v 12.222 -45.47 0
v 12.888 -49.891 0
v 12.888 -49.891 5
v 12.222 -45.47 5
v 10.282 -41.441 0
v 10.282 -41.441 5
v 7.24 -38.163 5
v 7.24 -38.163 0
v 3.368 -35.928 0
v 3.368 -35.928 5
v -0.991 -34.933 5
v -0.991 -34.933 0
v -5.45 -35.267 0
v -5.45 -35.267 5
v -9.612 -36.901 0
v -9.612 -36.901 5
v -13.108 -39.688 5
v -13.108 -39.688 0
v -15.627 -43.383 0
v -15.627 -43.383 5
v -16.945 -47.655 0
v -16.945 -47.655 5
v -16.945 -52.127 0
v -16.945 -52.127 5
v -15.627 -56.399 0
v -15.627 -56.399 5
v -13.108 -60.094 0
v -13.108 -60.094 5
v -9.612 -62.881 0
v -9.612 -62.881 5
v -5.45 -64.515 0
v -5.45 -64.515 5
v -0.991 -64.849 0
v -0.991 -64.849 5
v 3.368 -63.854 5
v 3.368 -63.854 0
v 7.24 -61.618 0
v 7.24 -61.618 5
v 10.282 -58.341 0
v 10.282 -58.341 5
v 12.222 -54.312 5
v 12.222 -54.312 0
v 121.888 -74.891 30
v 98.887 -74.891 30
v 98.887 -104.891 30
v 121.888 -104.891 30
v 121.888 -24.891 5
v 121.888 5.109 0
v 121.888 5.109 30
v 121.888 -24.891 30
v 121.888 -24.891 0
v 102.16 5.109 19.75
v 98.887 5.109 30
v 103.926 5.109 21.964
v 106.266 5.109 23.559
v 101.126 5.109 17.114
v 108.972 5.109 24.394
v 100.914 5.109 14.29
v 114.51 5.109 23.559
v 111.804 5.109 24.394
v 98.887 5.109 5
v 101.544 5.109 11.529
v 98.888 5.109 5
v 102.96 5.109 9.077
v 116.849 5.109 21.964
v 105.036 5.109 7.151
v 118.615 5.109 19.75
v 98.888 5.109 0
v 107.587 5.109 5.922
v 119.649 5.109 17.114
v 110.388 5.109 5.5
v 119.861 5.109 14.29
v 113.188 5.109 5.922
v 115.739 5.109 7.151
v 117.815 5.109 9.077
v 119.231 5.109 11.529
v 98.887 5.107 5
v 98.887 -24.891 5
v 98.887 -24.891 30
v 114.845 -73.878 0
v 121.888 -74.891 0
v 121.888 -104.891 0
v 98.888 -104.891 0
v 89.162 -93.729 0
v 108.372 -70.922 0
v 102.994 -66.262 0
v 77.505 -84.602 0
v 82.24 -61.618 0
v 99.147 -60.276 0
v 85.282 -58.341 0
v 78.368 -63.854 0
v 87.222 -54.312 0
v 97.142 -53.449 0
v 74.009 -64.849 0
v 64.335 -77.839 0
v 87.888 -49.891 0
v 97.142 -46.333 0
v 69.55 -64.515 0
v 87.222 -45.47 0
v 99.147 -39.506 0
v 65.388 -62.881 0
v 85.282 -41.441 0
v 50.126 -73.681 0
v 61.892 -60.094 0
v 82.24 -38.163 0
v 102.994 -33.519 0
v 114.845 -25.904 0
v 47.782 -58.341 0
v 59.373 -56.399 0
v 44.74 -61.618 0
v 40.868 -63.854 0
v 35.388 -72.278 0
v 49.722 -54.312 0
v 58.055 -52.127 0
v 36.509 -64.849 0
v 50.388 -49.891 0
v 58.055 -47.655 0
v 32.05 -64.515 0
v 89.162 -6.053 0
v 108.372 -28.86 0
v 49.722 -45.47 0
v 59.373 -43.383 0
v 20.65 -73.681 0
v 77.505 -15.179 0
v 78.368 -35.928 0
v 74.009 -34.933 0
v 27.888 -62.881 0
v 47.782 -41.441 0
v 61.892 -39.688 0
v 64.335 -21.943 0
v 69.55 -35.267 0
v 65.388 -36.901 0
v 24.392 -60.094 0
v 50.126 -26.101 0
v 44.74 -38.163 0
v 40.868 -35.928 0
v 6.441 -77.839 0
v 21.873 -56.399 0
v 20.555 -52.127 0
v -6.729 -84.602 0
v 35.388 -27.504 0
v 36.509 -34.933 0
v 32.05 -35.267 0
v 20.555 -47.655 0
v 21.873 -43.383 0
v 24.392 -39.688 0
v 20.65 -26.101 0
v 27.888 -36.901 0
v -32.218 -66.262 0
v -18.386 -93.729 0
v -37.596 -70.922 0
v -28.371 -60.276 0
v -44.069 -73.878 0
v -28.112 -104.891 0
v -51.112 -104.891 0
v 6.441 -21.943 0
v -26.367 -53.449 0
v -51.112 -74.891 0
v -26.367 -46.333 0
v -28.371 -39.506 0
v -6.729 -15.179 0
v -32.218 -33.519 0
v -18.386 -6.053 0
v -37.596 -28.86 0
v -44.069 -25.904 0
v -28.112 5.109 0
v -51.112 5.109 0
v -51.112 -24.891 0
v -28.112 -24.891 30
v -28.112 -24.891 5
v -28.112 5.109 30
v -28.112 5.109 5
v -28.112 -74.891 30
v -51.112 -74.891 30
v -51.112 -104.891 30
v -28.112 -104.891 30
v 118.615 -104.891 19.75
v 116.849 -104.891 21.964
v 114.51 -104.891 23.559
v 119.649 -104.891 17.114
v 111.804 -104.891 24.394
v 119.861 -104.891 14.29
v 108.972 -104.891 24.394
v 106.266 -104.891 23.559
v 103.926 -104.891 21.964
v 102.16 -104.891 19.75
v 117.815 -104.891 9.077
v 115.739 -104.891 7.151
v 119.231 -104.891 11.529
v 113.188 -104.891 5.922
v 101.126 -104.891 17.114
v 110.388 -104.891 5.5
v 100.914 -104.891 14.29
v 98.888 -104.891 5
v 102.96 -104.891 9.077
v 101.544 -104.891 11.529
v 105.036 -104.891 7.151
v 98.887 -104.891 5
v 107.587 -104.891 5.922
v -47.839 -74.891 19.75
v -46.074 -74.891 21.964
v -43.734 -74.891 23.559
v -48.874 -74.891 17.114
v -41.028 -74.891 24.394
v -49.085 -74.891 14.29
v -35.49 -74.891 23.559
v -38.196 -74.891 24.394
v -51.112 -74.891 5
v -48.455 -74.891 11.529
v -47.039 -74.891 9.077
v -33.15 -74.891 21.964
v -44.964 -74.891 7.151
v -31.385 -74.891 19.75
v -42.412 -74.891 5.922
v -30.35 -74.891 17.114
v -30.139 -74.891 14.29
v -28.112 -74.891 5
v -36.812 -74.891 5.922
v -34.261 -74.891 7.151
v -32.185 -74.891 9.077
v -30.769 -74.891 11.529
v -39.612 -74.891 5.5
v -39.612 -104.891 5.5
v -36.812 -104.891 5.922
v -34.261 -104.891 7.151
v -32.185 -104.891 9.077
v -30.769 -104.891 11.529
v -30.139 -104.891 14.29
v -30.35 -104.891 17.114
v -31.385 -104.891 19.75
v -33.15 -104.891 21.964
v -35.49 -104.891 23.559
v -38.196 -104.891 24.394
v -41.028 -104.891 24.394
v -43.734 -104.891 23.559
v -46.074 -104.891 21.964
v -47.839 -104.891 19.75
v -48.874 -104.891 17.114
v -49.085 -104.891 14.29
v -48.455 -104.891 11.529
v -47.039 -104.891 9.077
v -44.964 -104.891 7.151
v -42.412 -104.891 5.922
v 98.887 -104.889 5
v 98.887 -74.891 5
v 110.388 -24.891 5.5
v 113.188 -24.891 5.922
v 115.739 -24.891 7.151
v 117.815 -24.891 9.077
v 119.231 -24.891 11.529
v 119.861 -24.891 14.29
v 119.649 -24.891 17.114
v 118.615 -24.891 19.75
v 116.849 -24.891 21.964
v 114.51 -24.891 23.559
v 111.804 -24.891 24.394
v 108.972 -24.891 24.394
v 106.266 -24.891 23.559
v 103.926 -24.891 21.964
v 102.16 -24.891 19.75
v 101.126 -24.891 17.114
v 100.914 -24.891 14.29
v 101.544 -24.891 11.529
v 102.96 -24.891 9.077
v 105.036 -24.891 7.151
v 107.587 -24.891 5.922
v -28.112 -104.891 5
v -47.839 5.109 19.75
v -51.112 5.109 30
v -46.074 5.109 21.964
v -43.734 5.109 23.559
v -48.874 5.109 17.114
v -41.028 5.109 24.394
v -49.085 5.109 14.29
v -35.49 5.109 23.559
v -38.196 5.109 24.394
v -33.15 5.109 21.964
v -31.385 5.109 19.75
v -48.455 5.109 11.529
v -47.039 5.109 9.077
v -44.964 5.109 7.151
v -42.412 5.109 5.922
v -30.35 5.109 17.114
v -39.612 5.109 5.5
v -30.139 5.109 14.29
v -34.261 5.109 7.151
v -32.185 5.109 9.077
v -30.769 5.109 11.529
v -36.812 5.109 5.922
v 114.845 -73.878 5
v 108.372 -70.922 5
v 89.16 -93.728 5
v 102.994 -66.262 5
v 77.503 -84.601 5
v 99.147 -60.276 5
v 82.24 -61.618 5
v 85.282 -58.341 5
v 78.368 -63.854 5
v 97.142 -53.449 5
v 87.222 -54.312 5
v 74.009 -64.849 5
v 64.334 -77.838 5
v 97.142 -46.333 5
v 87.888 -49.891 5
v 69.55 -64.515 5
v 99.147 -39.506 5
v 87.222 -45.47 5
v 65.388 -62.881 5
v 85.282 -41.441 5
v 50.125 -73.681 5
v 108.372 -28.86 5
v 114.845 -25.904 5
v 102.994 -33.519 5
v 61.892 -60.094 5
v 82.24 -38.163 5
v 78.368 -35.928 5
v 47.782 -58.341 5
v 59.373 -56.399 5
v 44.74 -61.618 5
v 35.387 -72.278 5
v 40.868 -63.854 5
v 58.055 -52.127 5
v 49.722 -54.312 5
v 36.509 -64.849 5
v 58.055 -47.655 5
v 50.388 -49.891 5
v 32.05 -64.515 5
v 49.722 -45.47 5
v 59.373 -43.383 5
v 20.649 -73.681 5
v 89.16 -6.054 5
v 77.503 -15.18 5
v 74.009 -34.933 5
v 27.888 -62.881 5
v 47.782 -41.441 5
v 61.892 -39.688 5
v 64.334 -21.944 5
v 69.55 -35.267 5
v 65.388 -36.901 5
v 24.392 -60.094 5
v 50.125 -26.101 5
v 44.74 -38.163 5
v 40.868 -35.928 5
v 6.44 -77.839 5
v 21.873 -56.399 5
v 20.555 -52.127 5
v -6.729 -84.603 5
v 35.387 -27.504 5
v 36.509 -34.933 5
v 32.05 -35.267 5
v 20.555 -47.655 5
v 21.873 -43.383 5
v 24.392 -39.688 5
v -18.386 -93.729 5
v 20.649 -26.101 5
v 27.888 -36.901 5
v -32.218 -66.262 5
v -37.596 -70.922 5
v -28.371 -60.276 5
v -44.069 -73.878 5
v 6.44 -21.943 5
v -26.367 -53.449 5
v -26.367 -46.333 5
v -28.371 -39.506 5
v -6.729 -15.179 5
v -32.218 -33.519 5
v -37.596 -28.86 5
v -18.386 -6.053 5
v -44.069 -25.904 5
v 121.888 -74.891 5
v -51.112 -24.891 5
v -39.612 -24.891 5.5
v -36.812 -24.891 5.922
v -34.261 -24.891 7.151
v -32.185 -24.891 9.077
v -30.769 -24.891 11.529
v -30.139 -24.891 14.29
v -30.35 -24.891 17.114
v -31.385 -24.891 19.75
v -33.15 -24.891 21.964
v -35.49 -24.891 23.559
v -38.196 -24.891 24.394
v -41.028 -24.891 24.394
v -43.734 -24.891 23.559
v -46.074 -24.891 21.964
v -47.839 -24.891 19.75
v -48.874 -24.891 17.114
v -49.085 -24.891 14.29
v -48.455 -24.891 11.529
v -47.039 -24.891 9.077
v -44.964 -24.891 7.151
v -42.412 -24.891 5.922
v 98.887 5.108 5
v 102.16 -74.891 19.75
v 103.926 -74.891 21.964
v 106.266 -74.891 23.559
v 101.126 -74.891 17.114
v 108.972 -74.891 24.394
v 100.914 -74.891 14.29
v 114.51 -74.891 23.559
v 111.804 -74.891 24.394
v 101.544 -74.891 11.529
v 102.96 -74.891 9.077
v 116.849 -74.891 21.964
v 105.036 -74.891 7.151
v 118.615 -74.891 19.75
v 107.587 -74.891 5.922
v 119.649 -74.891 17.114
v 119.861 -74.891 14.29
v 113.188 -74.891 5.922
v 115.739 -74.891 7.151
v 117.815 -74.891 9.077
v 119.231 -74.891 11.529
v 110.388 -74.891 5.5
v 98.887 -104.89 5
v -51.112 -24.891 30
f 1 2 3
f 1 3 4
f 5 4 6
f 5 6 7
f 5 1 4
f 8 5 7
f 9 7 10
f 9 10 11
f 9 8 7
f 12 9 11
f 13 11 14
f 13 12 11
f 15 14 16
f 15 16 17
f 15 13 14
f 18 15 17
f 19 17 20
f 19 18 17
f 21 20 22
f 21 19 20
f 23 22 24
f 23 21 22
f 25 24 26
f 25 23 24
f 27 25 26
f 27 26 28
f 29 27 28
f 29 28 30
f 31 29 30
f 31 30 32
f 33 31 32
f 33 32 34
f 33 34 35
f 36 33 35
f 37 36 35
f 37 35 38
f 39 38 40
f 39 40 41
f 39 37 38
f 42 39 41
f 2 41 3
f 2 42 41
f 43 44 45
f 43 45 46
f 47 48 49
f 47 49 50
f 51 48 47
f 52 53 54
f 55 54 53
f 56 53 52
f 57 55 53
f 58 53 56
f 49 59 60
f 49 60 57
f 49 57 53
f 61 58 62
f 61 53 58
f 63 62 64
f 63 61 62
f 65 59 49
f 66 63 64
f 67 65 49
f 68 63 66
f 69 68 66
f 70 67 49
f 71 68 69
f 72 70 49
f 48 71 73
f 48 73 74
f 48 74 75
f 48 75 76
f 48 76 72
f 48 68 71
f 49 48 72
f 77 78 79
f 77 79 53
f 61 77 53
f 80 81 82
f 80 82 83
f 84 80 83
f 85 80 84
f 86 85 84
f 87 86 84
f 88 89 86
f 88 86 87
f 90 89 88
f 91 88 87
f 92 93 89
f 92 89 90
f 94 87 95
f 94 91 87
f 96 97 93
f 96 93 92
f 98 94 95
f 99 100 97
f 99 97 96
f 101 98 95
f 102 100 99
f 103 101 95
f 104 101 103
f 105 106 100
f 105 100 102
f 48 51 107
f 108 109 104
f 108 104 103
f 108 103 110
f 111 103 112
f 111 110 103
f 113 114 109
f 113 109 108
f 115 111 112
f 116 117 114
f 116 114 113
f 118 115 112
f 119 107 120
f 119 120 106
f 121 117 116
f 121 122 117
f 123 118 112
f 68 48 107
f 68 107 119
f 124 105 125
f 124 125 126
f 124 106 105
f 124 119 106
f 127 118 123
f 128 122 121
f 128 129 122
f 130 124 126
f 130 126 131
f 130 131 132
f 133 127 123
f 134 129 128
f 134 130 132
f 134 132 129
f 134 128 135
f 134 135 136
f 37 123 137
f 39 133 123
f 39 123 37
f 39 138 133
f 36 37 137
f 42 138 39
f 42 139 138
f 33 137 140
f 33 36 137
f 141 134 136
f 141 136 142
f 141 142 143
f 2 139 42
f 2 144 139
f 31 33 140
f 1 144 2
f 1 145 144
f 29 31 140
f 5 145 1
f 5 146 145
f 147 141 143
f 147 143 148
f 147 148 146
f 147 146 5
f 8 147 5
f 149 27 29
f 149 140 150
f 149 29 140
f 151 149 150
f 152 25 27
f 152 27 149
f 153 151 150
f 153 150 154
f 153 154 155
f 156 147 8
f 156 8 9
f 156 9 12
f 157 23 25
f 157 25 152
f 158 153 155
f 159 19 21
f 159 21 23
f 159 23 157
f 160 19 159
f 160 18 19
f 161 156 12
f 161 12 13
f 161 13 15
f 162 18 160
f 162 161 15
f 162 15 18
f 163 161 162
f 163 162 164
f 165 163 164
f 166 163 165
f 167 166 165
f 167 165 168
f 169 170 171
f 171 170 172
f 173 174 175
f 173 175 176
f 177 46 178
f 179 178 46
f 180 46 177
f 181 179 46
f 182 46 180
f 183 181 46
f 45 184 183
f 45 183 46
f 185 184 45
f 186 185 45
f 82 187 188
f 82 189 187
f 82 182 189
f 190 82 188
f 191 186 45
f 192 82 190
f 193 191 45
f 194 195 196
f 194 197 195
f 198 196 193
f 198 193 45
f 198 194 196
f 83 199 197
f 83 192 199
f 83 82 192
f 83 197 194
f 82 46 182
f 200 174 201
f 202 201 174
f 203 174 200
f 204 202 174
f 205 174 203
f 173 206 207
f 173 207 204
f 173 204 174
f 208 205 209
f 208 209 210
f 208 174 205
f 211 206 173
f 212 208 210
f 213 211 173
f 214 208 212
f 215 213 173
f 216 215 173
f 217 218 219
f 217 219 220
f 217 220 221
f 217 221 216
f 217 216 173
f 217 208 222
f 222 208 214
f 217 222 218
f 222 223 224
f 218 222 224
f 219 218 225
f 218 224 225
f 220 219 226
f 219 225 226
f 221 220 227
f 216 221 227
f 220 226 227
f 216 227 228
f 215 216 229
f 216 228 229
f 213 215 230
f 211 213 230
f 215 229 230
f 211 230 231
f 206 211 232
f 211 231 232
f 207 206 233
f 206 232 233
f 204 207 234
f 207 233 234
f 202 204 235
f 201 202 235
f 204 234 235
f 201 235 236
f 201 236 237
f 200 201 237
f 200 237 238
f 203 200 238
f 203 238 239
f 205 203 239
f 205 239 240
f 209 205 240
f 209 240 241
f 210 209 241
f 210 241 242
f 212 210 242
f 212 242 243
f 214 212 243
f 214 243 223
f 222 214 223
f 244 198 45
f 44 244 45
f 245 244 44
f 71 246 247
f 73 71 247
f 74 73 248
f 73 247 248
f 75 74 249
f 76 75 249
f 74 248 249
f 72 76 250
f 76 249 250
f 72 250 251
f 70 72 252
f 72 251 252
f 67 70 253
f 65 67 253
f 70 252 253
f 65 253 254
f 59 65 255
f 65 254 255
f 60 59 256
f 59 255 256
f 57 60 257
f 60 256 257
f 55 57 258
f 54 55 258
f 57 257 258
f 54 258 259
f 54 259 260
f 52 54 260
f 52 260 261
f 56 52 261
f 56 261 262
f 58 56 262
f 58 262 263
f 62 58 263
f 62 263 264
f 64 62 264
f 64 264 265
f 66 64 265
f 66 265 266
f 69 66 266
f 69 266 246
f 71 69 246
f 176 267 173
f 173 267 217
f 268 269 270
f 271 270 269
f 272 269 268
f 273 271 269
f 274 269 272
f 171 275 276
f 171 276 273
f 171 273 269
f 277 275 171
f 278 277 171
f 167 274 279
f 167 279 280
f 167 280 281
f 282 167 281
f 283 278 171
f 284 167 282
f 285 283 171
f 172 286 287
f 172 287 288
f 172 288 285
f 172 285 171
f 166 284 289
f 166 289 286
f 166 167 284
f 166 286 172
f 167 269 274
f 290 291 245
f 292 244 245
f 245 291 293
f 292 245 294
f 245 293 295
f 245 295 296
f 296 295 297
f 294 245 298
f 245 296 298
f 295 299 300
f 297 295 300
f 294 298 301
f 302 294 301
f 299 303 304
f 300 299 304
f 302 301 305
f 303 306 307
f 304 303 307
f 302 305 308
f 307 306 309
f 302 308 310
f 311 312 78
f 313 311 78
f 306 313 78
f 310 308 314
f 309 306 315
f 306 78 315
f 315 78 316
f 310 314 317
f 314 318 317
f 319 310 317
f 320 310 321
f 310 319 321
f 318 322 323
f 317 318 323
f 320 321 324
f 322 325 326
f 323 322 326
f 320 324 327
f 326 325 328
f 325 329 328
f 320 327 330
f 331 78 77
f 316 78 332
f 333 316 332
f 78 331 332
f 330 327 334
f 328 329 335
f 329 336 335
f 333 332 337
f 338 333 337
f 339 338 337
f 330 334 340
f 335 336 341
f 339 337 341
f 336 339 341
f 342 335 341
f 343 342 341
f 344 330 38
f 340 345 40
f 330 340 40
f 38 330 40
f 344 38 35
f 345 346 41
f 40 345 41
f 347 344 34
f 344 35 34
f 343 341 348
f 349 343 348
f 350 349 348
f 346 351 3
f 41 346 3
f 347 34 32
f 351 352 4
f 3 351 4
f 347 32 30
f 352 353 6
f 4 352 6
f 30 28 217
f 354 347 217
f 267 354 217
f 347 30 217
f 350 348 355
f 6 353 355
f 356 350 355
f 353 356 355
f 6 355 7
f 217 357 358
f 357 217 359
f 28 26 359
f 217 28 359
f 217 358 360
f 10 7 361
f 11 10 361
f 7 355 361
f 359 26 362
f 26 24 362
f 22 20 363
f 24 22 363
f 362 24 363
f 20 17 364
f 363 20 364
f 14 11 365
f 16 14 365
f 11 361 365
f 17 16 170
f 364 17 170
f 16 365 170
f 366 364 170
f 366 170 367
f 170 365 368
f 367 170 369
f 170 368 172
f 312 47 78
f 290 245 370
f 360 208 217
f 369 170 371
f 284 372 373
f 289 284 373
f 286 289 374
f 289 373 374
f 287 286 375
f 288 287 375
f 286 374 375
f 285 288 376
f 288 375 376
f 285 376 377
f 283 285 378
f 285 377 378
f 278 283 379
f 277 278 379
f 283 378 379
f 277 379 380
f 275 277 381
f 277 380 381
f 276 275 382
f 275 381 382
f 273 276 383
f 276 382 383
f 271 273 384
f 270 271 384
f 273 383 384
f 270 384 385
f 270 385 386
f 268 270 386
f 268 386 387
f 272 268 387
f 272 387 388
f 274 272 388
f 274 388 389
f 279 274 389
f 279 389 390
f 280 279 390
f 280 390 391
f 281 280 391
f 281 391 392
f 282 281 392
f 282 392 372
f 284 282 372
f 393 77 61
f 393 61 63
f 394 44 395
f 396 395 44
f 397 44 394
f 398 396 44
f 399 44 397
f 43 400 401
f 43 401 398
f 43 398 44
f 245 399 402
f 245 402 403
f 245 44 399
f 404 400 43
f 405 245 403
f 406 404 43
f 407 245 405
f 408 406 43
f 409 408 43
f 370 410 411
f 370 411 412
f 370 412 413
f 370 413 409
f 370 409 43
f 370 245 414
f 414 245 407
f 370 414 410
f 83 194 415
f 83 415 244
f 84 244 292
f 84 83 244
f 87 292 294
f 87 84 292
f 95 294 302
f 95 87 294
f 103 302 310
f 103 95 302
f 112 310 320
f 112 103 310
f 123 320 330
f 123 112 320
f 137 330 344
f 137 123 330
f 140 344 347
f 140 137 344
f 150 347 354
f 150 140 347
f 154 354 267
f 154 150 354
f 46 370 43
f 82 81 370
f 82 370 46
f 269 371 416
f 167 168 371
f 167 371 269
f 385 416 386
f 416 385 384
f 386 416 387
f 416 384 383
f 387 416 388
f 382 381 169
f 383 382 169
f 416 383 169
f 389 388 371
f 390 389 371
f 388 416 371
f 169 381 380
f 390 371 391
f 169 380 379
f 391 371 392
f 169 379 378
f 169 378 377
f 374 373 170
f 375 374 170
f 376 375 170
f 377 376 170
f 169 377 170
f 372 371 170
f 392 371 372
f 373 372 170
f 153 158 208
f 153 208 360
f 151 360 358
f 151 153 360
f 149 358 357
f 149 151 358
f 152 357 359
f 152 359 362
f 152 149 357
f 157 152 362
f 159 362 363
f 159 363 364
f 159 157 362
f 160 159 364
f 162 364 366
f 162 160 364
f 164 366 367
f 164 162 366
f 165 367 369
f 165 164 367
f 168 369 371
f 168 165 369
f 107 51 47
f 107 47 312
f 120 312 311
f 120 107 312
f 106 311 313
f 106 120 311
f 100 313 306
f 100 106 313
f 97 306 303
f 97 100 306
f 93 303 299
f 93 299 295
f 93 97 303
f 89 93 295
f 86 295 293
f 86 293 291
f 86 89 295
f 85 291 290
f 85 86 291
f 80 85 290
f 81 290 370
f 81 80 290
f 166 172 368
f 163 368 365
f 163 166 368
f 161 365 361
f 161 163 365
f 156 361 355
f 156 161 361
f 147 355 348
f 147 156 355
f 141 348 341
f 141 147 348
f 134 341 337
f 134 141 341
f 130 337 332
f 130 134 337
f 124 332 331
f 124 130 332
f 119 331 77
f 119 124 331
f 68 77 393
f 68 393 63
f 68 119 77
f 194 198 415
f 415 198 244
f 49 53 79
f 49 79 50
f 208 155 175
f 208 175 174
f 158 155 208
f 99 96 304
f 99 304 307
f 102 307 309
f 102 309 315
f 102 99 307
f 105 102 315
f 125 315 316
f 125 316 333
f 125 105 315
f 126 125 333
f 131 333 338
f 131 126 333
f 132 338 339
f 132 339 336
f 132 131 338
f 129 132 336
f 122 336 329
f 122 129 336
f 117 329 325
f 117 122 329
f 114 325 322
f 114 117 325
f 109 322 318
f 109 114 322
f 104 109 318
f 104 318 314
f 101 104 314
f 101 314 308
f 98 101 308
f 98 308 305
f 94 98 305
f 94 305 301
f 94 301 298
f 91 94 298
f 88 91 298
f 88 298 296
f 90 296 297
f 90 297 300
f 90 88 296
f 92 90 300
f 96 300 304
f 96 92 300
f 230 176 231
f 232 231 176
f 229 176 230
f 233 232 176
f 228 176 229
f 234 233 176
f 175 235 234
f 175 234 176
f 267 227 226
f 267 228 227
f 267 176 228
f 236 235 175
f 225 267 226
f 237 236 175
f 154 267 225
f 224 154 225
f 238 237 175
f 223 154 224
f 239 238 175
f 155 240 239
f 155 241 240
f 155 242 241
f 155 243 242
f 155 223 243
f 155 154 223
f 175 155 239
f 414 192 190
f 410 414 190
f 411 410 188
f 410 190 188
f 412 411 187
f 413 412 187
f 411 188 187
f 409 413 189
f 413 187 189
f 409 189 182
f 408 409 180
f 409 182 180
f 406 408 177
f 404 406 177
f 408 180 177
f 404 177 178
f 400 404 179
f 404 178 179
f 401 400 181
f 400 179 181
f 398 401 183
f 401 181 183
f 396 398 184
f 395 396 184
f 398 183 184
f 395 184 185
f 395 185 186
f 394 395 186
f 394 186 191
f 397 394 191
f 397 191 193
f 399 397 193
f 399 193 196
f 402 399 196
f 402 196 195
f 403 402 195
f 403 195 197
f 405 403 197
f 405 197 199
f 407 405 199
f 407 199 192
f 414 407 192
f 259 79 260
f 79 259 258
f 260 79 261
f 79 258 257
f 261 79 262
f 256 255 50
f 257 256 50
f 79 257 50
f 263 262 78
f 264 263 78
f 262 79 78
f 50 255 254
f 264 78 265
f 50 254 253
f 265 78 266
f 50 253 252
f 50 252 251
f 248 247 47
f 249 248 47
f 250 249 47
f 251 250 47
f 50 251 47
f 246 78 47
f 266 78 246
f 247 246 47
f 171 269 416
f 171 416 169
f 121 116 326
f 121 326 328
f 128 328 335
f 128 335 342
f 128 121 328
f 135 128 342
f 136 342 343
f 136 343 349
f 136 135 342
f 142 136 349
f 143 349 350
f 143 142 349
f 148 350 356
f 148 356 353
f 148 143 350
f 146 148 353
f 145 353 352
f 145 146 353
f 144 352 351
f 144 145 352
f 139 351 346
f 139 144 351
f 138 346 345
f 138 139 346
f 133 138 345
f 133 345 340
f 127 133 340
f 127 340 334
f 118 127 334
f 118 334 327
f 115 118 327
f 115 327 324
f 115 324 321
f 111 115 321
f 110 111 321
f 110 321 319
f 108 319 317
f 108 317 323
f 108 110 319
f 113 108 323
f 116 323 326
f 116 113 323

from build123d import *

# Parameters (mm, degrees)
SKETCH1_R           = 15
BOSS_EXTRUDE1_DEPTH = 5
SKETCH2_W           = 23
SKETCH2_H           = 30
SKETCH2_W_2         = 23.001410072
BOSS_EXTRUDE2_DEPTH = 25
CUT_EXTRUDE1_REACH  = 168.903
SKETCH3_R           = 9.5


with BuildPart() as part:
    # Sketch1 → Boss-Extrude1 (new body)
    with BuildSketch(Plane.XY):
        with BuildLine():
            Line((-51.112042928, 5.109070396), (-28.112042928, 5.109070396))
            ThreePointArc((-28.112042928, 5.109070396), (35.387957072, -27.503737277), (98.887957072, 5.109070396))
            Line((98.887957072, 5.109070396), (121.887957072, 5.109070396))
            Line((121.887957072, 5.109070396), (121.887957072, -24.890929604))
            ThreePointArc((121.887957072, -24.890929604), (96.887957072, -49.890929604), (121.887957072, -74.890929604))
            Line((121.887957072, -74.890929604), (121.887957072, -104.890929604))
            Line((121.887957072, -104.890929604), (98.887957072, -104.890929604))
            ThreePointArc((98.887957072, -104.890929604), (35.387957072, -72.278121931), (-28.112042928, -104.890929604))
            Line((-28.112042928, -104.890929604), (-51.112042928, -104.890929604))
            Line((-51.112042928, -104.890929604), (-51.112042928, -74.890929604))
            ThreePointArc((-51.112042928, -74.890929604), (-26.112042928, -49.890929604), (-51.112042928, -24.890929604))
            Line((-51.112042928, -24.890929604), (-51.112042928, 5.109070396))
        make_face()
        with Locations((35.387957072, -49.890929604)):
            Circle(SKETCH1_R, mode=Mode.SUBTRACT)
        with Locations((72.887957072, -49.890929604)):
            Circle(SKETCH1_R, mode=Mode.SUBTRACT)
        with Locations((-2.112042928, -49.890929604)):
            Circle(SKETCH1_R, mode=Mode.SUBTRACT)
    extrude(amount=BOSS_EXTRUDE1_DEPTH)

    # Sketch2 → Boss-Extrude2 (add)
    with BuildSketch(Plane.XY.offset(5)):
        with Locations((-39.612042928, -9.890929604)):
            Rectangle(SKETCH2_W, SKETCH2_H)
        with Locations((110.387252036, -9.890929604)):
            Rectangle(SKETCH2_W_2, SKETCH2_H)
        with Locations((110.387252036, -89.890929604)):
            Rectangle(SKETCH2_W_2, SKETCH2_H)
        with Locations((-39.612042928, -89.890929604)):
            Rectangle(SKETCH2_W, SKETCH2_H)
    extrude(amount=BOSS_EXTRUDE2_DEPTH)

    # Cut-Extrude1: up to this face of the body (flat: up to its plane)
    cut_extrude1_end = Plane(part.part.faces().sort_by_distance((-39.612042928, 5.109070396, 15))[0])
    # Sketch3 → Cut-Extrude1 (cut, up to the picked face)
    with BuildSketch(Plane.XZ.offset(104.890929604), mode=Mode.PRIVATE) as cut_extrude1_sk1:
        with Locations(Location((110.387604554, 15, 0), (0, 0, 270))):
            Circle(SKETCH3_R)
    cut_extrude1_tool1 = split(extrude(cut_extrude1_sk1.sketch, amount=-CUT_EXTRUDE1_REACH, mode=Mode.PRIVATE), bisect_by=cut_extrude1_end, keep=Keep.BOTH, mode=Mode.PRIVATE)
    # Sketch3 → Cut-Extrude1 (cut, up to the picked face)
    with BuildSketch(Plane.XZ.offset(104.890929604), mode=Mode.PRIVATE) as cut_extrude1_sk2:
        with Locations(Location((-39.612042928, 15, 0), (0, 0, 270))):
            Circle(SKETCH3_R)
    cut_extrude1_tool2 = split(extrude(cut_extrude1_sk2.sketch, amount=-CUT_EXTRUDE1_REACH, mode=Mode.PRIVATE), bisect_by=cut_extrude1_end, keep=Keep.BOTH, mode=Mode.PRIVATE)
    add(cut_extrude1_tool1.solids().sort_by(Axis((110.387605, -104.89093, 15), (0, 1, 0)))[0], mode=Mode.SUBTRACT)
    add(cut_extrude1_tool2.solids().sort_by(Axis((-39.612043, -104.89093, 15), (0, 1, 0)))[0], mode=Mode.SUBTRACT)


solid = part.part
